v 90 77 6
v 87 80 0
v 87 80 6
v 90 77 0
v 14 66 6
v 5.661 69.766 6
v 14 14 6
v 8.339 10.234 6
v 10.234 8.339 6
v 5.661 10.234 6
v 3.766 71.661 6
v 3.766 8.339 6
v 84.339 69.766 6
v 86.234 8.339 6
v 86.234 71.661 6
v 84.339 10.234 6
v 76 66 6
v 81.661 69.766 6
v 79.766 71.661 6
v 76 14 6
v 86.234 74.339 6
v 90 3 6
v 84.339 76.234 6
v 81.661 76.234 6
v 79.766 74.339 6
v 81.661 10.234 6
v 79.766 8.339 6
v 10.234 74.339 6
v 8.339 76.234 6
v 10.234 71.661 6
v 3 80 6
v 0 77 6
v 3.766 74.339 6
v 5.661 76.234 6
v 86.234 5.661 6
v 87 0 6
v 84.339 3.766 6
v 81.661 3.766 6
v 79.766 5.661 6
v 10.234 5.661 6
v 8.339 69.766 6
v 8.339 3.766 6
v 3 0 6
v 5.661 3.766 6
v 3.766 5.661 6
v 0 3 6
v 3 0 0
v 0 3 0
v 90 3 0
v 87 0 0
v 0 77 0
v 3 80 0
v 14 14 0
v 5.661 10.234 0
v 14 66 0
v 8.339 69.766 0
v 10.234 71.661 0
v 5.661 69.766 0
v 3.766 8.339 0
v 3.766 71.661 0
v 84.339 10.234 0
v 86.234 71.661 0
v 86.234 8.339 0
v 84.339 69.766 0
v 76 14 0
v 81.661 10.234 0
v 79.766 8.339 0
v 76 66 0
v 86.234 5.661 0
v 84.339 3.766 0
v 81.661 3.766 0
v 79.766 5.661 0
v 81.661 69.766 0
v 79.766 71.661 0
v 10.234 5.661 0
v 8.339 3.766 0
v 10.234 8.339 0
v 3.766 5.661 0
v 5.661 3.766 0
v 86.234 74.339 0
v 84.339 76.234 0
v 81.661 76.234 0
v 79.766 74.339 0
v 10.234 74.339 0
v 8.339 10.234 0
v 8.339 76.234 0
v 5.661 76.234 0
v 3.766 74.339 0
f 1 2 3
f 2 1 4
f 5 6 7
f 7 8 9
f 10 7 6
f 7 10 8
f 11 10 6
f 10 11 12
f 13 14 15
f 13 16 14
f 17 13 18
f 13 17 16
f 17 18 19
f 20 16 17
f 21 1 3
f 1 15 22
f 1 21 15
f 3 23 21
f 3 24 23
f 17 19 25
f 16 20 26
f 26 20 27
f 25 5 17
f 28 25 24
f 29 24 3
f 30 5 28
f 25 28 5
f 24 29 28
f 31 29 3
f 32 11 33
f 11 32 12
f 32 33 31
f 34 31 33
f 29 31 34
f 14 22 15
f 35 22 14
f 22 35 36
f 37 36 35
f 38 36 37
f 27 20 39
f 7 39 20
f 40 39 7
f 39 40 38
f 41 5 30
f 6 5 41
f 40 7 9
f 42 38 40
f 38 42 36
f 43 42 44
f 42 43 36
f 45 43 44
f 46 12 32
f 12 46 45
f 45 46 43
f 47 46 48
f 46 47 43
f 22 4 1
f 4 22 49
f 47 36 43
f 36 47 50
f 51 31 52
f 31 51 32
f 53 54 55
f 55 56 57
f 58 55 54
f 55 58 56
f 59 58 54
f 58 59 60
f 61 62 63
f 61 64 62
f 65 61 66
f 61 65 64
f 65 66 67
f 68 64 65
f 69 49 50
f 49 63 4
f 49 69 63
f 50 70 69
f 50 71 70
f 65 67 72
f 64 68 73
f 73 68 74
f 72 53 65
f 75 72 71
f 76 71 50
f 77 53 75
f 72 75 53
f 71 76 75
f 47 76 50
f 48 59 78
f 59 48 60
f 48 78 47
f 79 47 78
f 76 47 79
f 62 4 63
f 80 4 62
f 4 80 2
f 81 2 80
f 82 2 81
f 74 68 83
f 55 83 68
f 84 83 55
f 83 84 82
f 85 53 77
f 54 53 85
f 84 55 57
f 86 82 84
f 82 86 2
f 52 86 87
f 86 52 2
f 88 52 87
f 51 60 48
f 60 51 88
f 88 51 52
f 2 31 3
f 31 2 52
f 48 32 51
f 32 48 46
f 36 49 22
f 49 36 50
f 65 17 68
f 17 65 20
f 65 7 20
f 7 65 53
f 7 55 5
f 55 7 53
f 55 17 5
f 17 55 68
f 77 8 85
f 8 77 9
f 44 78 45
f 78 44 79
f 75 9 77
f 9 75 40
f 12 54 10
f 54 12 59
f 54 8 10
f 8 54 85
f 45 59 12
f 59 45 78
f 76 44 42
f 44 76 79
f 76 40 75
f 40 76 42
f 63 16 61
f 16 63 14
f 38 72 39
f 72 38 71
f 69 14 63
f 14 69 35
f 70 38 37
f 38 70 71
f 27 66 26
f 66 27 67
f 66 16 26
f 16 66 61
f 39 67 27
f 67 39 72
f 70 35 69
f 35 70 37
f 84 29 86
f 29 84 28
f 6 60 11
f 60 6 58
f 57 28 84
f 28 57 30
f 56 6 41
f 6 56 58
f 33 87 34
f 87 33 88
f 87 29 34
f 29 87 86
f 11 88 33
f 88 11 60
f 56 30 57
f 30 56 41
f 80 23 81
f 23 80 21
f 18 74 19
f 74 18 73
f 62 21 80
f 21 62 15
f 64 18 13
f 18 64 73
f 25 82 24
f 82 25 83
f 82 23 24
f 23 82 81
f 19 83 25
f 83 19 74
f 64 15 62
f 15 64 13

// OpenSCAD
$fn = 32;

// ----------------------------------------------------------------------
// Frame plate: 90 x 80 frame, 14 mm rails
// ----------------------------------------------------------------------

// --- parameters (mm) ---
plate_l = 90;             // plate length, X
plate_w = 80;             // plate width, Y
plate_t = 6;              // plate thickness, Z (extrusion height)
corner_c = 3;             // corner chamfer
frame_bar = 14;           // frame rail width
bolt_r = 3.5;             // corner bolt window radius
bolt_inset = 7;           // bolt centre inset from the edges

win_l = plate_l - 2 * frame_bar;  // window length
win_w = plate_w - 2 * frame_bar;  // window width
bolt_d = 2 * bolt_r;  // corner hole diameter

profile = [[3, 0], [87, 0], [90, 3], [90, 77], [87, 80], [3, 80], [0, 77], [0, 3]];  // primary outline, 8 points, counter clockwise
void_1 = [[14, 14], [76, 14], [76, 66], [14, 66]];  // the window, 4 points
void_2 = [[10.234, 8.339], [8.339, 10.234], [5.661, 10.234], [3.766, 8.339], [3.766, 5.661], [5.661, 3.766], [8.339, 3.766], [10.234, 5.661]];  // corner bolt window, 8 points
void_3 = [[86.234, 8.339], [84.339, 10.234], [81.661, 10.234], [79.766, 8.339], [79.766, 5.661], [81.661, 3.766], [84.339, 3.766], [86.234, 5.661]];  // corner bolt window, 8 points
void_4 = [[10.234, 74.339], [8.339, 76.234], [5.661, 76.234], [3.766, 74.339], [3.766, 71.661], [5.661, 69.766], [8.339, 69.766], [10.234, 71.661]];  // corner bolt window, 8 points
void_5 = [[86.234, 74.339], [84.339, 76.234], [81.661, 76.234], [79.766, 74.339], [79.766, 71.661], [81.661, 69.766], [84.339, 69.766], [86.234, 71.661]];  // corner bolt window, 8 points

// --- the one profile operation ---
difference() {
  linear_extrude(height = plate_t) polygon(points = profile);
  translate([0, 0, -1])
    linear_extrude(height = plate_t + 2) polygon(points = void_1);
  translate([0, 0, -1])
    linear_extrude(height = plate_t + 2) polygon(points = void_2);
  translate([0, 0, -1])
    linear_extrude(height = plate_t + 2) polygon(points = void_3);
  translate([0, 0, -1])
    linear_extrude(height = plate_t + 2) polygon(points = void_4);
  translate([0, 0, -1])
    linear_extrude(height = plate_t + 2) polygon(points = void_5);
}
